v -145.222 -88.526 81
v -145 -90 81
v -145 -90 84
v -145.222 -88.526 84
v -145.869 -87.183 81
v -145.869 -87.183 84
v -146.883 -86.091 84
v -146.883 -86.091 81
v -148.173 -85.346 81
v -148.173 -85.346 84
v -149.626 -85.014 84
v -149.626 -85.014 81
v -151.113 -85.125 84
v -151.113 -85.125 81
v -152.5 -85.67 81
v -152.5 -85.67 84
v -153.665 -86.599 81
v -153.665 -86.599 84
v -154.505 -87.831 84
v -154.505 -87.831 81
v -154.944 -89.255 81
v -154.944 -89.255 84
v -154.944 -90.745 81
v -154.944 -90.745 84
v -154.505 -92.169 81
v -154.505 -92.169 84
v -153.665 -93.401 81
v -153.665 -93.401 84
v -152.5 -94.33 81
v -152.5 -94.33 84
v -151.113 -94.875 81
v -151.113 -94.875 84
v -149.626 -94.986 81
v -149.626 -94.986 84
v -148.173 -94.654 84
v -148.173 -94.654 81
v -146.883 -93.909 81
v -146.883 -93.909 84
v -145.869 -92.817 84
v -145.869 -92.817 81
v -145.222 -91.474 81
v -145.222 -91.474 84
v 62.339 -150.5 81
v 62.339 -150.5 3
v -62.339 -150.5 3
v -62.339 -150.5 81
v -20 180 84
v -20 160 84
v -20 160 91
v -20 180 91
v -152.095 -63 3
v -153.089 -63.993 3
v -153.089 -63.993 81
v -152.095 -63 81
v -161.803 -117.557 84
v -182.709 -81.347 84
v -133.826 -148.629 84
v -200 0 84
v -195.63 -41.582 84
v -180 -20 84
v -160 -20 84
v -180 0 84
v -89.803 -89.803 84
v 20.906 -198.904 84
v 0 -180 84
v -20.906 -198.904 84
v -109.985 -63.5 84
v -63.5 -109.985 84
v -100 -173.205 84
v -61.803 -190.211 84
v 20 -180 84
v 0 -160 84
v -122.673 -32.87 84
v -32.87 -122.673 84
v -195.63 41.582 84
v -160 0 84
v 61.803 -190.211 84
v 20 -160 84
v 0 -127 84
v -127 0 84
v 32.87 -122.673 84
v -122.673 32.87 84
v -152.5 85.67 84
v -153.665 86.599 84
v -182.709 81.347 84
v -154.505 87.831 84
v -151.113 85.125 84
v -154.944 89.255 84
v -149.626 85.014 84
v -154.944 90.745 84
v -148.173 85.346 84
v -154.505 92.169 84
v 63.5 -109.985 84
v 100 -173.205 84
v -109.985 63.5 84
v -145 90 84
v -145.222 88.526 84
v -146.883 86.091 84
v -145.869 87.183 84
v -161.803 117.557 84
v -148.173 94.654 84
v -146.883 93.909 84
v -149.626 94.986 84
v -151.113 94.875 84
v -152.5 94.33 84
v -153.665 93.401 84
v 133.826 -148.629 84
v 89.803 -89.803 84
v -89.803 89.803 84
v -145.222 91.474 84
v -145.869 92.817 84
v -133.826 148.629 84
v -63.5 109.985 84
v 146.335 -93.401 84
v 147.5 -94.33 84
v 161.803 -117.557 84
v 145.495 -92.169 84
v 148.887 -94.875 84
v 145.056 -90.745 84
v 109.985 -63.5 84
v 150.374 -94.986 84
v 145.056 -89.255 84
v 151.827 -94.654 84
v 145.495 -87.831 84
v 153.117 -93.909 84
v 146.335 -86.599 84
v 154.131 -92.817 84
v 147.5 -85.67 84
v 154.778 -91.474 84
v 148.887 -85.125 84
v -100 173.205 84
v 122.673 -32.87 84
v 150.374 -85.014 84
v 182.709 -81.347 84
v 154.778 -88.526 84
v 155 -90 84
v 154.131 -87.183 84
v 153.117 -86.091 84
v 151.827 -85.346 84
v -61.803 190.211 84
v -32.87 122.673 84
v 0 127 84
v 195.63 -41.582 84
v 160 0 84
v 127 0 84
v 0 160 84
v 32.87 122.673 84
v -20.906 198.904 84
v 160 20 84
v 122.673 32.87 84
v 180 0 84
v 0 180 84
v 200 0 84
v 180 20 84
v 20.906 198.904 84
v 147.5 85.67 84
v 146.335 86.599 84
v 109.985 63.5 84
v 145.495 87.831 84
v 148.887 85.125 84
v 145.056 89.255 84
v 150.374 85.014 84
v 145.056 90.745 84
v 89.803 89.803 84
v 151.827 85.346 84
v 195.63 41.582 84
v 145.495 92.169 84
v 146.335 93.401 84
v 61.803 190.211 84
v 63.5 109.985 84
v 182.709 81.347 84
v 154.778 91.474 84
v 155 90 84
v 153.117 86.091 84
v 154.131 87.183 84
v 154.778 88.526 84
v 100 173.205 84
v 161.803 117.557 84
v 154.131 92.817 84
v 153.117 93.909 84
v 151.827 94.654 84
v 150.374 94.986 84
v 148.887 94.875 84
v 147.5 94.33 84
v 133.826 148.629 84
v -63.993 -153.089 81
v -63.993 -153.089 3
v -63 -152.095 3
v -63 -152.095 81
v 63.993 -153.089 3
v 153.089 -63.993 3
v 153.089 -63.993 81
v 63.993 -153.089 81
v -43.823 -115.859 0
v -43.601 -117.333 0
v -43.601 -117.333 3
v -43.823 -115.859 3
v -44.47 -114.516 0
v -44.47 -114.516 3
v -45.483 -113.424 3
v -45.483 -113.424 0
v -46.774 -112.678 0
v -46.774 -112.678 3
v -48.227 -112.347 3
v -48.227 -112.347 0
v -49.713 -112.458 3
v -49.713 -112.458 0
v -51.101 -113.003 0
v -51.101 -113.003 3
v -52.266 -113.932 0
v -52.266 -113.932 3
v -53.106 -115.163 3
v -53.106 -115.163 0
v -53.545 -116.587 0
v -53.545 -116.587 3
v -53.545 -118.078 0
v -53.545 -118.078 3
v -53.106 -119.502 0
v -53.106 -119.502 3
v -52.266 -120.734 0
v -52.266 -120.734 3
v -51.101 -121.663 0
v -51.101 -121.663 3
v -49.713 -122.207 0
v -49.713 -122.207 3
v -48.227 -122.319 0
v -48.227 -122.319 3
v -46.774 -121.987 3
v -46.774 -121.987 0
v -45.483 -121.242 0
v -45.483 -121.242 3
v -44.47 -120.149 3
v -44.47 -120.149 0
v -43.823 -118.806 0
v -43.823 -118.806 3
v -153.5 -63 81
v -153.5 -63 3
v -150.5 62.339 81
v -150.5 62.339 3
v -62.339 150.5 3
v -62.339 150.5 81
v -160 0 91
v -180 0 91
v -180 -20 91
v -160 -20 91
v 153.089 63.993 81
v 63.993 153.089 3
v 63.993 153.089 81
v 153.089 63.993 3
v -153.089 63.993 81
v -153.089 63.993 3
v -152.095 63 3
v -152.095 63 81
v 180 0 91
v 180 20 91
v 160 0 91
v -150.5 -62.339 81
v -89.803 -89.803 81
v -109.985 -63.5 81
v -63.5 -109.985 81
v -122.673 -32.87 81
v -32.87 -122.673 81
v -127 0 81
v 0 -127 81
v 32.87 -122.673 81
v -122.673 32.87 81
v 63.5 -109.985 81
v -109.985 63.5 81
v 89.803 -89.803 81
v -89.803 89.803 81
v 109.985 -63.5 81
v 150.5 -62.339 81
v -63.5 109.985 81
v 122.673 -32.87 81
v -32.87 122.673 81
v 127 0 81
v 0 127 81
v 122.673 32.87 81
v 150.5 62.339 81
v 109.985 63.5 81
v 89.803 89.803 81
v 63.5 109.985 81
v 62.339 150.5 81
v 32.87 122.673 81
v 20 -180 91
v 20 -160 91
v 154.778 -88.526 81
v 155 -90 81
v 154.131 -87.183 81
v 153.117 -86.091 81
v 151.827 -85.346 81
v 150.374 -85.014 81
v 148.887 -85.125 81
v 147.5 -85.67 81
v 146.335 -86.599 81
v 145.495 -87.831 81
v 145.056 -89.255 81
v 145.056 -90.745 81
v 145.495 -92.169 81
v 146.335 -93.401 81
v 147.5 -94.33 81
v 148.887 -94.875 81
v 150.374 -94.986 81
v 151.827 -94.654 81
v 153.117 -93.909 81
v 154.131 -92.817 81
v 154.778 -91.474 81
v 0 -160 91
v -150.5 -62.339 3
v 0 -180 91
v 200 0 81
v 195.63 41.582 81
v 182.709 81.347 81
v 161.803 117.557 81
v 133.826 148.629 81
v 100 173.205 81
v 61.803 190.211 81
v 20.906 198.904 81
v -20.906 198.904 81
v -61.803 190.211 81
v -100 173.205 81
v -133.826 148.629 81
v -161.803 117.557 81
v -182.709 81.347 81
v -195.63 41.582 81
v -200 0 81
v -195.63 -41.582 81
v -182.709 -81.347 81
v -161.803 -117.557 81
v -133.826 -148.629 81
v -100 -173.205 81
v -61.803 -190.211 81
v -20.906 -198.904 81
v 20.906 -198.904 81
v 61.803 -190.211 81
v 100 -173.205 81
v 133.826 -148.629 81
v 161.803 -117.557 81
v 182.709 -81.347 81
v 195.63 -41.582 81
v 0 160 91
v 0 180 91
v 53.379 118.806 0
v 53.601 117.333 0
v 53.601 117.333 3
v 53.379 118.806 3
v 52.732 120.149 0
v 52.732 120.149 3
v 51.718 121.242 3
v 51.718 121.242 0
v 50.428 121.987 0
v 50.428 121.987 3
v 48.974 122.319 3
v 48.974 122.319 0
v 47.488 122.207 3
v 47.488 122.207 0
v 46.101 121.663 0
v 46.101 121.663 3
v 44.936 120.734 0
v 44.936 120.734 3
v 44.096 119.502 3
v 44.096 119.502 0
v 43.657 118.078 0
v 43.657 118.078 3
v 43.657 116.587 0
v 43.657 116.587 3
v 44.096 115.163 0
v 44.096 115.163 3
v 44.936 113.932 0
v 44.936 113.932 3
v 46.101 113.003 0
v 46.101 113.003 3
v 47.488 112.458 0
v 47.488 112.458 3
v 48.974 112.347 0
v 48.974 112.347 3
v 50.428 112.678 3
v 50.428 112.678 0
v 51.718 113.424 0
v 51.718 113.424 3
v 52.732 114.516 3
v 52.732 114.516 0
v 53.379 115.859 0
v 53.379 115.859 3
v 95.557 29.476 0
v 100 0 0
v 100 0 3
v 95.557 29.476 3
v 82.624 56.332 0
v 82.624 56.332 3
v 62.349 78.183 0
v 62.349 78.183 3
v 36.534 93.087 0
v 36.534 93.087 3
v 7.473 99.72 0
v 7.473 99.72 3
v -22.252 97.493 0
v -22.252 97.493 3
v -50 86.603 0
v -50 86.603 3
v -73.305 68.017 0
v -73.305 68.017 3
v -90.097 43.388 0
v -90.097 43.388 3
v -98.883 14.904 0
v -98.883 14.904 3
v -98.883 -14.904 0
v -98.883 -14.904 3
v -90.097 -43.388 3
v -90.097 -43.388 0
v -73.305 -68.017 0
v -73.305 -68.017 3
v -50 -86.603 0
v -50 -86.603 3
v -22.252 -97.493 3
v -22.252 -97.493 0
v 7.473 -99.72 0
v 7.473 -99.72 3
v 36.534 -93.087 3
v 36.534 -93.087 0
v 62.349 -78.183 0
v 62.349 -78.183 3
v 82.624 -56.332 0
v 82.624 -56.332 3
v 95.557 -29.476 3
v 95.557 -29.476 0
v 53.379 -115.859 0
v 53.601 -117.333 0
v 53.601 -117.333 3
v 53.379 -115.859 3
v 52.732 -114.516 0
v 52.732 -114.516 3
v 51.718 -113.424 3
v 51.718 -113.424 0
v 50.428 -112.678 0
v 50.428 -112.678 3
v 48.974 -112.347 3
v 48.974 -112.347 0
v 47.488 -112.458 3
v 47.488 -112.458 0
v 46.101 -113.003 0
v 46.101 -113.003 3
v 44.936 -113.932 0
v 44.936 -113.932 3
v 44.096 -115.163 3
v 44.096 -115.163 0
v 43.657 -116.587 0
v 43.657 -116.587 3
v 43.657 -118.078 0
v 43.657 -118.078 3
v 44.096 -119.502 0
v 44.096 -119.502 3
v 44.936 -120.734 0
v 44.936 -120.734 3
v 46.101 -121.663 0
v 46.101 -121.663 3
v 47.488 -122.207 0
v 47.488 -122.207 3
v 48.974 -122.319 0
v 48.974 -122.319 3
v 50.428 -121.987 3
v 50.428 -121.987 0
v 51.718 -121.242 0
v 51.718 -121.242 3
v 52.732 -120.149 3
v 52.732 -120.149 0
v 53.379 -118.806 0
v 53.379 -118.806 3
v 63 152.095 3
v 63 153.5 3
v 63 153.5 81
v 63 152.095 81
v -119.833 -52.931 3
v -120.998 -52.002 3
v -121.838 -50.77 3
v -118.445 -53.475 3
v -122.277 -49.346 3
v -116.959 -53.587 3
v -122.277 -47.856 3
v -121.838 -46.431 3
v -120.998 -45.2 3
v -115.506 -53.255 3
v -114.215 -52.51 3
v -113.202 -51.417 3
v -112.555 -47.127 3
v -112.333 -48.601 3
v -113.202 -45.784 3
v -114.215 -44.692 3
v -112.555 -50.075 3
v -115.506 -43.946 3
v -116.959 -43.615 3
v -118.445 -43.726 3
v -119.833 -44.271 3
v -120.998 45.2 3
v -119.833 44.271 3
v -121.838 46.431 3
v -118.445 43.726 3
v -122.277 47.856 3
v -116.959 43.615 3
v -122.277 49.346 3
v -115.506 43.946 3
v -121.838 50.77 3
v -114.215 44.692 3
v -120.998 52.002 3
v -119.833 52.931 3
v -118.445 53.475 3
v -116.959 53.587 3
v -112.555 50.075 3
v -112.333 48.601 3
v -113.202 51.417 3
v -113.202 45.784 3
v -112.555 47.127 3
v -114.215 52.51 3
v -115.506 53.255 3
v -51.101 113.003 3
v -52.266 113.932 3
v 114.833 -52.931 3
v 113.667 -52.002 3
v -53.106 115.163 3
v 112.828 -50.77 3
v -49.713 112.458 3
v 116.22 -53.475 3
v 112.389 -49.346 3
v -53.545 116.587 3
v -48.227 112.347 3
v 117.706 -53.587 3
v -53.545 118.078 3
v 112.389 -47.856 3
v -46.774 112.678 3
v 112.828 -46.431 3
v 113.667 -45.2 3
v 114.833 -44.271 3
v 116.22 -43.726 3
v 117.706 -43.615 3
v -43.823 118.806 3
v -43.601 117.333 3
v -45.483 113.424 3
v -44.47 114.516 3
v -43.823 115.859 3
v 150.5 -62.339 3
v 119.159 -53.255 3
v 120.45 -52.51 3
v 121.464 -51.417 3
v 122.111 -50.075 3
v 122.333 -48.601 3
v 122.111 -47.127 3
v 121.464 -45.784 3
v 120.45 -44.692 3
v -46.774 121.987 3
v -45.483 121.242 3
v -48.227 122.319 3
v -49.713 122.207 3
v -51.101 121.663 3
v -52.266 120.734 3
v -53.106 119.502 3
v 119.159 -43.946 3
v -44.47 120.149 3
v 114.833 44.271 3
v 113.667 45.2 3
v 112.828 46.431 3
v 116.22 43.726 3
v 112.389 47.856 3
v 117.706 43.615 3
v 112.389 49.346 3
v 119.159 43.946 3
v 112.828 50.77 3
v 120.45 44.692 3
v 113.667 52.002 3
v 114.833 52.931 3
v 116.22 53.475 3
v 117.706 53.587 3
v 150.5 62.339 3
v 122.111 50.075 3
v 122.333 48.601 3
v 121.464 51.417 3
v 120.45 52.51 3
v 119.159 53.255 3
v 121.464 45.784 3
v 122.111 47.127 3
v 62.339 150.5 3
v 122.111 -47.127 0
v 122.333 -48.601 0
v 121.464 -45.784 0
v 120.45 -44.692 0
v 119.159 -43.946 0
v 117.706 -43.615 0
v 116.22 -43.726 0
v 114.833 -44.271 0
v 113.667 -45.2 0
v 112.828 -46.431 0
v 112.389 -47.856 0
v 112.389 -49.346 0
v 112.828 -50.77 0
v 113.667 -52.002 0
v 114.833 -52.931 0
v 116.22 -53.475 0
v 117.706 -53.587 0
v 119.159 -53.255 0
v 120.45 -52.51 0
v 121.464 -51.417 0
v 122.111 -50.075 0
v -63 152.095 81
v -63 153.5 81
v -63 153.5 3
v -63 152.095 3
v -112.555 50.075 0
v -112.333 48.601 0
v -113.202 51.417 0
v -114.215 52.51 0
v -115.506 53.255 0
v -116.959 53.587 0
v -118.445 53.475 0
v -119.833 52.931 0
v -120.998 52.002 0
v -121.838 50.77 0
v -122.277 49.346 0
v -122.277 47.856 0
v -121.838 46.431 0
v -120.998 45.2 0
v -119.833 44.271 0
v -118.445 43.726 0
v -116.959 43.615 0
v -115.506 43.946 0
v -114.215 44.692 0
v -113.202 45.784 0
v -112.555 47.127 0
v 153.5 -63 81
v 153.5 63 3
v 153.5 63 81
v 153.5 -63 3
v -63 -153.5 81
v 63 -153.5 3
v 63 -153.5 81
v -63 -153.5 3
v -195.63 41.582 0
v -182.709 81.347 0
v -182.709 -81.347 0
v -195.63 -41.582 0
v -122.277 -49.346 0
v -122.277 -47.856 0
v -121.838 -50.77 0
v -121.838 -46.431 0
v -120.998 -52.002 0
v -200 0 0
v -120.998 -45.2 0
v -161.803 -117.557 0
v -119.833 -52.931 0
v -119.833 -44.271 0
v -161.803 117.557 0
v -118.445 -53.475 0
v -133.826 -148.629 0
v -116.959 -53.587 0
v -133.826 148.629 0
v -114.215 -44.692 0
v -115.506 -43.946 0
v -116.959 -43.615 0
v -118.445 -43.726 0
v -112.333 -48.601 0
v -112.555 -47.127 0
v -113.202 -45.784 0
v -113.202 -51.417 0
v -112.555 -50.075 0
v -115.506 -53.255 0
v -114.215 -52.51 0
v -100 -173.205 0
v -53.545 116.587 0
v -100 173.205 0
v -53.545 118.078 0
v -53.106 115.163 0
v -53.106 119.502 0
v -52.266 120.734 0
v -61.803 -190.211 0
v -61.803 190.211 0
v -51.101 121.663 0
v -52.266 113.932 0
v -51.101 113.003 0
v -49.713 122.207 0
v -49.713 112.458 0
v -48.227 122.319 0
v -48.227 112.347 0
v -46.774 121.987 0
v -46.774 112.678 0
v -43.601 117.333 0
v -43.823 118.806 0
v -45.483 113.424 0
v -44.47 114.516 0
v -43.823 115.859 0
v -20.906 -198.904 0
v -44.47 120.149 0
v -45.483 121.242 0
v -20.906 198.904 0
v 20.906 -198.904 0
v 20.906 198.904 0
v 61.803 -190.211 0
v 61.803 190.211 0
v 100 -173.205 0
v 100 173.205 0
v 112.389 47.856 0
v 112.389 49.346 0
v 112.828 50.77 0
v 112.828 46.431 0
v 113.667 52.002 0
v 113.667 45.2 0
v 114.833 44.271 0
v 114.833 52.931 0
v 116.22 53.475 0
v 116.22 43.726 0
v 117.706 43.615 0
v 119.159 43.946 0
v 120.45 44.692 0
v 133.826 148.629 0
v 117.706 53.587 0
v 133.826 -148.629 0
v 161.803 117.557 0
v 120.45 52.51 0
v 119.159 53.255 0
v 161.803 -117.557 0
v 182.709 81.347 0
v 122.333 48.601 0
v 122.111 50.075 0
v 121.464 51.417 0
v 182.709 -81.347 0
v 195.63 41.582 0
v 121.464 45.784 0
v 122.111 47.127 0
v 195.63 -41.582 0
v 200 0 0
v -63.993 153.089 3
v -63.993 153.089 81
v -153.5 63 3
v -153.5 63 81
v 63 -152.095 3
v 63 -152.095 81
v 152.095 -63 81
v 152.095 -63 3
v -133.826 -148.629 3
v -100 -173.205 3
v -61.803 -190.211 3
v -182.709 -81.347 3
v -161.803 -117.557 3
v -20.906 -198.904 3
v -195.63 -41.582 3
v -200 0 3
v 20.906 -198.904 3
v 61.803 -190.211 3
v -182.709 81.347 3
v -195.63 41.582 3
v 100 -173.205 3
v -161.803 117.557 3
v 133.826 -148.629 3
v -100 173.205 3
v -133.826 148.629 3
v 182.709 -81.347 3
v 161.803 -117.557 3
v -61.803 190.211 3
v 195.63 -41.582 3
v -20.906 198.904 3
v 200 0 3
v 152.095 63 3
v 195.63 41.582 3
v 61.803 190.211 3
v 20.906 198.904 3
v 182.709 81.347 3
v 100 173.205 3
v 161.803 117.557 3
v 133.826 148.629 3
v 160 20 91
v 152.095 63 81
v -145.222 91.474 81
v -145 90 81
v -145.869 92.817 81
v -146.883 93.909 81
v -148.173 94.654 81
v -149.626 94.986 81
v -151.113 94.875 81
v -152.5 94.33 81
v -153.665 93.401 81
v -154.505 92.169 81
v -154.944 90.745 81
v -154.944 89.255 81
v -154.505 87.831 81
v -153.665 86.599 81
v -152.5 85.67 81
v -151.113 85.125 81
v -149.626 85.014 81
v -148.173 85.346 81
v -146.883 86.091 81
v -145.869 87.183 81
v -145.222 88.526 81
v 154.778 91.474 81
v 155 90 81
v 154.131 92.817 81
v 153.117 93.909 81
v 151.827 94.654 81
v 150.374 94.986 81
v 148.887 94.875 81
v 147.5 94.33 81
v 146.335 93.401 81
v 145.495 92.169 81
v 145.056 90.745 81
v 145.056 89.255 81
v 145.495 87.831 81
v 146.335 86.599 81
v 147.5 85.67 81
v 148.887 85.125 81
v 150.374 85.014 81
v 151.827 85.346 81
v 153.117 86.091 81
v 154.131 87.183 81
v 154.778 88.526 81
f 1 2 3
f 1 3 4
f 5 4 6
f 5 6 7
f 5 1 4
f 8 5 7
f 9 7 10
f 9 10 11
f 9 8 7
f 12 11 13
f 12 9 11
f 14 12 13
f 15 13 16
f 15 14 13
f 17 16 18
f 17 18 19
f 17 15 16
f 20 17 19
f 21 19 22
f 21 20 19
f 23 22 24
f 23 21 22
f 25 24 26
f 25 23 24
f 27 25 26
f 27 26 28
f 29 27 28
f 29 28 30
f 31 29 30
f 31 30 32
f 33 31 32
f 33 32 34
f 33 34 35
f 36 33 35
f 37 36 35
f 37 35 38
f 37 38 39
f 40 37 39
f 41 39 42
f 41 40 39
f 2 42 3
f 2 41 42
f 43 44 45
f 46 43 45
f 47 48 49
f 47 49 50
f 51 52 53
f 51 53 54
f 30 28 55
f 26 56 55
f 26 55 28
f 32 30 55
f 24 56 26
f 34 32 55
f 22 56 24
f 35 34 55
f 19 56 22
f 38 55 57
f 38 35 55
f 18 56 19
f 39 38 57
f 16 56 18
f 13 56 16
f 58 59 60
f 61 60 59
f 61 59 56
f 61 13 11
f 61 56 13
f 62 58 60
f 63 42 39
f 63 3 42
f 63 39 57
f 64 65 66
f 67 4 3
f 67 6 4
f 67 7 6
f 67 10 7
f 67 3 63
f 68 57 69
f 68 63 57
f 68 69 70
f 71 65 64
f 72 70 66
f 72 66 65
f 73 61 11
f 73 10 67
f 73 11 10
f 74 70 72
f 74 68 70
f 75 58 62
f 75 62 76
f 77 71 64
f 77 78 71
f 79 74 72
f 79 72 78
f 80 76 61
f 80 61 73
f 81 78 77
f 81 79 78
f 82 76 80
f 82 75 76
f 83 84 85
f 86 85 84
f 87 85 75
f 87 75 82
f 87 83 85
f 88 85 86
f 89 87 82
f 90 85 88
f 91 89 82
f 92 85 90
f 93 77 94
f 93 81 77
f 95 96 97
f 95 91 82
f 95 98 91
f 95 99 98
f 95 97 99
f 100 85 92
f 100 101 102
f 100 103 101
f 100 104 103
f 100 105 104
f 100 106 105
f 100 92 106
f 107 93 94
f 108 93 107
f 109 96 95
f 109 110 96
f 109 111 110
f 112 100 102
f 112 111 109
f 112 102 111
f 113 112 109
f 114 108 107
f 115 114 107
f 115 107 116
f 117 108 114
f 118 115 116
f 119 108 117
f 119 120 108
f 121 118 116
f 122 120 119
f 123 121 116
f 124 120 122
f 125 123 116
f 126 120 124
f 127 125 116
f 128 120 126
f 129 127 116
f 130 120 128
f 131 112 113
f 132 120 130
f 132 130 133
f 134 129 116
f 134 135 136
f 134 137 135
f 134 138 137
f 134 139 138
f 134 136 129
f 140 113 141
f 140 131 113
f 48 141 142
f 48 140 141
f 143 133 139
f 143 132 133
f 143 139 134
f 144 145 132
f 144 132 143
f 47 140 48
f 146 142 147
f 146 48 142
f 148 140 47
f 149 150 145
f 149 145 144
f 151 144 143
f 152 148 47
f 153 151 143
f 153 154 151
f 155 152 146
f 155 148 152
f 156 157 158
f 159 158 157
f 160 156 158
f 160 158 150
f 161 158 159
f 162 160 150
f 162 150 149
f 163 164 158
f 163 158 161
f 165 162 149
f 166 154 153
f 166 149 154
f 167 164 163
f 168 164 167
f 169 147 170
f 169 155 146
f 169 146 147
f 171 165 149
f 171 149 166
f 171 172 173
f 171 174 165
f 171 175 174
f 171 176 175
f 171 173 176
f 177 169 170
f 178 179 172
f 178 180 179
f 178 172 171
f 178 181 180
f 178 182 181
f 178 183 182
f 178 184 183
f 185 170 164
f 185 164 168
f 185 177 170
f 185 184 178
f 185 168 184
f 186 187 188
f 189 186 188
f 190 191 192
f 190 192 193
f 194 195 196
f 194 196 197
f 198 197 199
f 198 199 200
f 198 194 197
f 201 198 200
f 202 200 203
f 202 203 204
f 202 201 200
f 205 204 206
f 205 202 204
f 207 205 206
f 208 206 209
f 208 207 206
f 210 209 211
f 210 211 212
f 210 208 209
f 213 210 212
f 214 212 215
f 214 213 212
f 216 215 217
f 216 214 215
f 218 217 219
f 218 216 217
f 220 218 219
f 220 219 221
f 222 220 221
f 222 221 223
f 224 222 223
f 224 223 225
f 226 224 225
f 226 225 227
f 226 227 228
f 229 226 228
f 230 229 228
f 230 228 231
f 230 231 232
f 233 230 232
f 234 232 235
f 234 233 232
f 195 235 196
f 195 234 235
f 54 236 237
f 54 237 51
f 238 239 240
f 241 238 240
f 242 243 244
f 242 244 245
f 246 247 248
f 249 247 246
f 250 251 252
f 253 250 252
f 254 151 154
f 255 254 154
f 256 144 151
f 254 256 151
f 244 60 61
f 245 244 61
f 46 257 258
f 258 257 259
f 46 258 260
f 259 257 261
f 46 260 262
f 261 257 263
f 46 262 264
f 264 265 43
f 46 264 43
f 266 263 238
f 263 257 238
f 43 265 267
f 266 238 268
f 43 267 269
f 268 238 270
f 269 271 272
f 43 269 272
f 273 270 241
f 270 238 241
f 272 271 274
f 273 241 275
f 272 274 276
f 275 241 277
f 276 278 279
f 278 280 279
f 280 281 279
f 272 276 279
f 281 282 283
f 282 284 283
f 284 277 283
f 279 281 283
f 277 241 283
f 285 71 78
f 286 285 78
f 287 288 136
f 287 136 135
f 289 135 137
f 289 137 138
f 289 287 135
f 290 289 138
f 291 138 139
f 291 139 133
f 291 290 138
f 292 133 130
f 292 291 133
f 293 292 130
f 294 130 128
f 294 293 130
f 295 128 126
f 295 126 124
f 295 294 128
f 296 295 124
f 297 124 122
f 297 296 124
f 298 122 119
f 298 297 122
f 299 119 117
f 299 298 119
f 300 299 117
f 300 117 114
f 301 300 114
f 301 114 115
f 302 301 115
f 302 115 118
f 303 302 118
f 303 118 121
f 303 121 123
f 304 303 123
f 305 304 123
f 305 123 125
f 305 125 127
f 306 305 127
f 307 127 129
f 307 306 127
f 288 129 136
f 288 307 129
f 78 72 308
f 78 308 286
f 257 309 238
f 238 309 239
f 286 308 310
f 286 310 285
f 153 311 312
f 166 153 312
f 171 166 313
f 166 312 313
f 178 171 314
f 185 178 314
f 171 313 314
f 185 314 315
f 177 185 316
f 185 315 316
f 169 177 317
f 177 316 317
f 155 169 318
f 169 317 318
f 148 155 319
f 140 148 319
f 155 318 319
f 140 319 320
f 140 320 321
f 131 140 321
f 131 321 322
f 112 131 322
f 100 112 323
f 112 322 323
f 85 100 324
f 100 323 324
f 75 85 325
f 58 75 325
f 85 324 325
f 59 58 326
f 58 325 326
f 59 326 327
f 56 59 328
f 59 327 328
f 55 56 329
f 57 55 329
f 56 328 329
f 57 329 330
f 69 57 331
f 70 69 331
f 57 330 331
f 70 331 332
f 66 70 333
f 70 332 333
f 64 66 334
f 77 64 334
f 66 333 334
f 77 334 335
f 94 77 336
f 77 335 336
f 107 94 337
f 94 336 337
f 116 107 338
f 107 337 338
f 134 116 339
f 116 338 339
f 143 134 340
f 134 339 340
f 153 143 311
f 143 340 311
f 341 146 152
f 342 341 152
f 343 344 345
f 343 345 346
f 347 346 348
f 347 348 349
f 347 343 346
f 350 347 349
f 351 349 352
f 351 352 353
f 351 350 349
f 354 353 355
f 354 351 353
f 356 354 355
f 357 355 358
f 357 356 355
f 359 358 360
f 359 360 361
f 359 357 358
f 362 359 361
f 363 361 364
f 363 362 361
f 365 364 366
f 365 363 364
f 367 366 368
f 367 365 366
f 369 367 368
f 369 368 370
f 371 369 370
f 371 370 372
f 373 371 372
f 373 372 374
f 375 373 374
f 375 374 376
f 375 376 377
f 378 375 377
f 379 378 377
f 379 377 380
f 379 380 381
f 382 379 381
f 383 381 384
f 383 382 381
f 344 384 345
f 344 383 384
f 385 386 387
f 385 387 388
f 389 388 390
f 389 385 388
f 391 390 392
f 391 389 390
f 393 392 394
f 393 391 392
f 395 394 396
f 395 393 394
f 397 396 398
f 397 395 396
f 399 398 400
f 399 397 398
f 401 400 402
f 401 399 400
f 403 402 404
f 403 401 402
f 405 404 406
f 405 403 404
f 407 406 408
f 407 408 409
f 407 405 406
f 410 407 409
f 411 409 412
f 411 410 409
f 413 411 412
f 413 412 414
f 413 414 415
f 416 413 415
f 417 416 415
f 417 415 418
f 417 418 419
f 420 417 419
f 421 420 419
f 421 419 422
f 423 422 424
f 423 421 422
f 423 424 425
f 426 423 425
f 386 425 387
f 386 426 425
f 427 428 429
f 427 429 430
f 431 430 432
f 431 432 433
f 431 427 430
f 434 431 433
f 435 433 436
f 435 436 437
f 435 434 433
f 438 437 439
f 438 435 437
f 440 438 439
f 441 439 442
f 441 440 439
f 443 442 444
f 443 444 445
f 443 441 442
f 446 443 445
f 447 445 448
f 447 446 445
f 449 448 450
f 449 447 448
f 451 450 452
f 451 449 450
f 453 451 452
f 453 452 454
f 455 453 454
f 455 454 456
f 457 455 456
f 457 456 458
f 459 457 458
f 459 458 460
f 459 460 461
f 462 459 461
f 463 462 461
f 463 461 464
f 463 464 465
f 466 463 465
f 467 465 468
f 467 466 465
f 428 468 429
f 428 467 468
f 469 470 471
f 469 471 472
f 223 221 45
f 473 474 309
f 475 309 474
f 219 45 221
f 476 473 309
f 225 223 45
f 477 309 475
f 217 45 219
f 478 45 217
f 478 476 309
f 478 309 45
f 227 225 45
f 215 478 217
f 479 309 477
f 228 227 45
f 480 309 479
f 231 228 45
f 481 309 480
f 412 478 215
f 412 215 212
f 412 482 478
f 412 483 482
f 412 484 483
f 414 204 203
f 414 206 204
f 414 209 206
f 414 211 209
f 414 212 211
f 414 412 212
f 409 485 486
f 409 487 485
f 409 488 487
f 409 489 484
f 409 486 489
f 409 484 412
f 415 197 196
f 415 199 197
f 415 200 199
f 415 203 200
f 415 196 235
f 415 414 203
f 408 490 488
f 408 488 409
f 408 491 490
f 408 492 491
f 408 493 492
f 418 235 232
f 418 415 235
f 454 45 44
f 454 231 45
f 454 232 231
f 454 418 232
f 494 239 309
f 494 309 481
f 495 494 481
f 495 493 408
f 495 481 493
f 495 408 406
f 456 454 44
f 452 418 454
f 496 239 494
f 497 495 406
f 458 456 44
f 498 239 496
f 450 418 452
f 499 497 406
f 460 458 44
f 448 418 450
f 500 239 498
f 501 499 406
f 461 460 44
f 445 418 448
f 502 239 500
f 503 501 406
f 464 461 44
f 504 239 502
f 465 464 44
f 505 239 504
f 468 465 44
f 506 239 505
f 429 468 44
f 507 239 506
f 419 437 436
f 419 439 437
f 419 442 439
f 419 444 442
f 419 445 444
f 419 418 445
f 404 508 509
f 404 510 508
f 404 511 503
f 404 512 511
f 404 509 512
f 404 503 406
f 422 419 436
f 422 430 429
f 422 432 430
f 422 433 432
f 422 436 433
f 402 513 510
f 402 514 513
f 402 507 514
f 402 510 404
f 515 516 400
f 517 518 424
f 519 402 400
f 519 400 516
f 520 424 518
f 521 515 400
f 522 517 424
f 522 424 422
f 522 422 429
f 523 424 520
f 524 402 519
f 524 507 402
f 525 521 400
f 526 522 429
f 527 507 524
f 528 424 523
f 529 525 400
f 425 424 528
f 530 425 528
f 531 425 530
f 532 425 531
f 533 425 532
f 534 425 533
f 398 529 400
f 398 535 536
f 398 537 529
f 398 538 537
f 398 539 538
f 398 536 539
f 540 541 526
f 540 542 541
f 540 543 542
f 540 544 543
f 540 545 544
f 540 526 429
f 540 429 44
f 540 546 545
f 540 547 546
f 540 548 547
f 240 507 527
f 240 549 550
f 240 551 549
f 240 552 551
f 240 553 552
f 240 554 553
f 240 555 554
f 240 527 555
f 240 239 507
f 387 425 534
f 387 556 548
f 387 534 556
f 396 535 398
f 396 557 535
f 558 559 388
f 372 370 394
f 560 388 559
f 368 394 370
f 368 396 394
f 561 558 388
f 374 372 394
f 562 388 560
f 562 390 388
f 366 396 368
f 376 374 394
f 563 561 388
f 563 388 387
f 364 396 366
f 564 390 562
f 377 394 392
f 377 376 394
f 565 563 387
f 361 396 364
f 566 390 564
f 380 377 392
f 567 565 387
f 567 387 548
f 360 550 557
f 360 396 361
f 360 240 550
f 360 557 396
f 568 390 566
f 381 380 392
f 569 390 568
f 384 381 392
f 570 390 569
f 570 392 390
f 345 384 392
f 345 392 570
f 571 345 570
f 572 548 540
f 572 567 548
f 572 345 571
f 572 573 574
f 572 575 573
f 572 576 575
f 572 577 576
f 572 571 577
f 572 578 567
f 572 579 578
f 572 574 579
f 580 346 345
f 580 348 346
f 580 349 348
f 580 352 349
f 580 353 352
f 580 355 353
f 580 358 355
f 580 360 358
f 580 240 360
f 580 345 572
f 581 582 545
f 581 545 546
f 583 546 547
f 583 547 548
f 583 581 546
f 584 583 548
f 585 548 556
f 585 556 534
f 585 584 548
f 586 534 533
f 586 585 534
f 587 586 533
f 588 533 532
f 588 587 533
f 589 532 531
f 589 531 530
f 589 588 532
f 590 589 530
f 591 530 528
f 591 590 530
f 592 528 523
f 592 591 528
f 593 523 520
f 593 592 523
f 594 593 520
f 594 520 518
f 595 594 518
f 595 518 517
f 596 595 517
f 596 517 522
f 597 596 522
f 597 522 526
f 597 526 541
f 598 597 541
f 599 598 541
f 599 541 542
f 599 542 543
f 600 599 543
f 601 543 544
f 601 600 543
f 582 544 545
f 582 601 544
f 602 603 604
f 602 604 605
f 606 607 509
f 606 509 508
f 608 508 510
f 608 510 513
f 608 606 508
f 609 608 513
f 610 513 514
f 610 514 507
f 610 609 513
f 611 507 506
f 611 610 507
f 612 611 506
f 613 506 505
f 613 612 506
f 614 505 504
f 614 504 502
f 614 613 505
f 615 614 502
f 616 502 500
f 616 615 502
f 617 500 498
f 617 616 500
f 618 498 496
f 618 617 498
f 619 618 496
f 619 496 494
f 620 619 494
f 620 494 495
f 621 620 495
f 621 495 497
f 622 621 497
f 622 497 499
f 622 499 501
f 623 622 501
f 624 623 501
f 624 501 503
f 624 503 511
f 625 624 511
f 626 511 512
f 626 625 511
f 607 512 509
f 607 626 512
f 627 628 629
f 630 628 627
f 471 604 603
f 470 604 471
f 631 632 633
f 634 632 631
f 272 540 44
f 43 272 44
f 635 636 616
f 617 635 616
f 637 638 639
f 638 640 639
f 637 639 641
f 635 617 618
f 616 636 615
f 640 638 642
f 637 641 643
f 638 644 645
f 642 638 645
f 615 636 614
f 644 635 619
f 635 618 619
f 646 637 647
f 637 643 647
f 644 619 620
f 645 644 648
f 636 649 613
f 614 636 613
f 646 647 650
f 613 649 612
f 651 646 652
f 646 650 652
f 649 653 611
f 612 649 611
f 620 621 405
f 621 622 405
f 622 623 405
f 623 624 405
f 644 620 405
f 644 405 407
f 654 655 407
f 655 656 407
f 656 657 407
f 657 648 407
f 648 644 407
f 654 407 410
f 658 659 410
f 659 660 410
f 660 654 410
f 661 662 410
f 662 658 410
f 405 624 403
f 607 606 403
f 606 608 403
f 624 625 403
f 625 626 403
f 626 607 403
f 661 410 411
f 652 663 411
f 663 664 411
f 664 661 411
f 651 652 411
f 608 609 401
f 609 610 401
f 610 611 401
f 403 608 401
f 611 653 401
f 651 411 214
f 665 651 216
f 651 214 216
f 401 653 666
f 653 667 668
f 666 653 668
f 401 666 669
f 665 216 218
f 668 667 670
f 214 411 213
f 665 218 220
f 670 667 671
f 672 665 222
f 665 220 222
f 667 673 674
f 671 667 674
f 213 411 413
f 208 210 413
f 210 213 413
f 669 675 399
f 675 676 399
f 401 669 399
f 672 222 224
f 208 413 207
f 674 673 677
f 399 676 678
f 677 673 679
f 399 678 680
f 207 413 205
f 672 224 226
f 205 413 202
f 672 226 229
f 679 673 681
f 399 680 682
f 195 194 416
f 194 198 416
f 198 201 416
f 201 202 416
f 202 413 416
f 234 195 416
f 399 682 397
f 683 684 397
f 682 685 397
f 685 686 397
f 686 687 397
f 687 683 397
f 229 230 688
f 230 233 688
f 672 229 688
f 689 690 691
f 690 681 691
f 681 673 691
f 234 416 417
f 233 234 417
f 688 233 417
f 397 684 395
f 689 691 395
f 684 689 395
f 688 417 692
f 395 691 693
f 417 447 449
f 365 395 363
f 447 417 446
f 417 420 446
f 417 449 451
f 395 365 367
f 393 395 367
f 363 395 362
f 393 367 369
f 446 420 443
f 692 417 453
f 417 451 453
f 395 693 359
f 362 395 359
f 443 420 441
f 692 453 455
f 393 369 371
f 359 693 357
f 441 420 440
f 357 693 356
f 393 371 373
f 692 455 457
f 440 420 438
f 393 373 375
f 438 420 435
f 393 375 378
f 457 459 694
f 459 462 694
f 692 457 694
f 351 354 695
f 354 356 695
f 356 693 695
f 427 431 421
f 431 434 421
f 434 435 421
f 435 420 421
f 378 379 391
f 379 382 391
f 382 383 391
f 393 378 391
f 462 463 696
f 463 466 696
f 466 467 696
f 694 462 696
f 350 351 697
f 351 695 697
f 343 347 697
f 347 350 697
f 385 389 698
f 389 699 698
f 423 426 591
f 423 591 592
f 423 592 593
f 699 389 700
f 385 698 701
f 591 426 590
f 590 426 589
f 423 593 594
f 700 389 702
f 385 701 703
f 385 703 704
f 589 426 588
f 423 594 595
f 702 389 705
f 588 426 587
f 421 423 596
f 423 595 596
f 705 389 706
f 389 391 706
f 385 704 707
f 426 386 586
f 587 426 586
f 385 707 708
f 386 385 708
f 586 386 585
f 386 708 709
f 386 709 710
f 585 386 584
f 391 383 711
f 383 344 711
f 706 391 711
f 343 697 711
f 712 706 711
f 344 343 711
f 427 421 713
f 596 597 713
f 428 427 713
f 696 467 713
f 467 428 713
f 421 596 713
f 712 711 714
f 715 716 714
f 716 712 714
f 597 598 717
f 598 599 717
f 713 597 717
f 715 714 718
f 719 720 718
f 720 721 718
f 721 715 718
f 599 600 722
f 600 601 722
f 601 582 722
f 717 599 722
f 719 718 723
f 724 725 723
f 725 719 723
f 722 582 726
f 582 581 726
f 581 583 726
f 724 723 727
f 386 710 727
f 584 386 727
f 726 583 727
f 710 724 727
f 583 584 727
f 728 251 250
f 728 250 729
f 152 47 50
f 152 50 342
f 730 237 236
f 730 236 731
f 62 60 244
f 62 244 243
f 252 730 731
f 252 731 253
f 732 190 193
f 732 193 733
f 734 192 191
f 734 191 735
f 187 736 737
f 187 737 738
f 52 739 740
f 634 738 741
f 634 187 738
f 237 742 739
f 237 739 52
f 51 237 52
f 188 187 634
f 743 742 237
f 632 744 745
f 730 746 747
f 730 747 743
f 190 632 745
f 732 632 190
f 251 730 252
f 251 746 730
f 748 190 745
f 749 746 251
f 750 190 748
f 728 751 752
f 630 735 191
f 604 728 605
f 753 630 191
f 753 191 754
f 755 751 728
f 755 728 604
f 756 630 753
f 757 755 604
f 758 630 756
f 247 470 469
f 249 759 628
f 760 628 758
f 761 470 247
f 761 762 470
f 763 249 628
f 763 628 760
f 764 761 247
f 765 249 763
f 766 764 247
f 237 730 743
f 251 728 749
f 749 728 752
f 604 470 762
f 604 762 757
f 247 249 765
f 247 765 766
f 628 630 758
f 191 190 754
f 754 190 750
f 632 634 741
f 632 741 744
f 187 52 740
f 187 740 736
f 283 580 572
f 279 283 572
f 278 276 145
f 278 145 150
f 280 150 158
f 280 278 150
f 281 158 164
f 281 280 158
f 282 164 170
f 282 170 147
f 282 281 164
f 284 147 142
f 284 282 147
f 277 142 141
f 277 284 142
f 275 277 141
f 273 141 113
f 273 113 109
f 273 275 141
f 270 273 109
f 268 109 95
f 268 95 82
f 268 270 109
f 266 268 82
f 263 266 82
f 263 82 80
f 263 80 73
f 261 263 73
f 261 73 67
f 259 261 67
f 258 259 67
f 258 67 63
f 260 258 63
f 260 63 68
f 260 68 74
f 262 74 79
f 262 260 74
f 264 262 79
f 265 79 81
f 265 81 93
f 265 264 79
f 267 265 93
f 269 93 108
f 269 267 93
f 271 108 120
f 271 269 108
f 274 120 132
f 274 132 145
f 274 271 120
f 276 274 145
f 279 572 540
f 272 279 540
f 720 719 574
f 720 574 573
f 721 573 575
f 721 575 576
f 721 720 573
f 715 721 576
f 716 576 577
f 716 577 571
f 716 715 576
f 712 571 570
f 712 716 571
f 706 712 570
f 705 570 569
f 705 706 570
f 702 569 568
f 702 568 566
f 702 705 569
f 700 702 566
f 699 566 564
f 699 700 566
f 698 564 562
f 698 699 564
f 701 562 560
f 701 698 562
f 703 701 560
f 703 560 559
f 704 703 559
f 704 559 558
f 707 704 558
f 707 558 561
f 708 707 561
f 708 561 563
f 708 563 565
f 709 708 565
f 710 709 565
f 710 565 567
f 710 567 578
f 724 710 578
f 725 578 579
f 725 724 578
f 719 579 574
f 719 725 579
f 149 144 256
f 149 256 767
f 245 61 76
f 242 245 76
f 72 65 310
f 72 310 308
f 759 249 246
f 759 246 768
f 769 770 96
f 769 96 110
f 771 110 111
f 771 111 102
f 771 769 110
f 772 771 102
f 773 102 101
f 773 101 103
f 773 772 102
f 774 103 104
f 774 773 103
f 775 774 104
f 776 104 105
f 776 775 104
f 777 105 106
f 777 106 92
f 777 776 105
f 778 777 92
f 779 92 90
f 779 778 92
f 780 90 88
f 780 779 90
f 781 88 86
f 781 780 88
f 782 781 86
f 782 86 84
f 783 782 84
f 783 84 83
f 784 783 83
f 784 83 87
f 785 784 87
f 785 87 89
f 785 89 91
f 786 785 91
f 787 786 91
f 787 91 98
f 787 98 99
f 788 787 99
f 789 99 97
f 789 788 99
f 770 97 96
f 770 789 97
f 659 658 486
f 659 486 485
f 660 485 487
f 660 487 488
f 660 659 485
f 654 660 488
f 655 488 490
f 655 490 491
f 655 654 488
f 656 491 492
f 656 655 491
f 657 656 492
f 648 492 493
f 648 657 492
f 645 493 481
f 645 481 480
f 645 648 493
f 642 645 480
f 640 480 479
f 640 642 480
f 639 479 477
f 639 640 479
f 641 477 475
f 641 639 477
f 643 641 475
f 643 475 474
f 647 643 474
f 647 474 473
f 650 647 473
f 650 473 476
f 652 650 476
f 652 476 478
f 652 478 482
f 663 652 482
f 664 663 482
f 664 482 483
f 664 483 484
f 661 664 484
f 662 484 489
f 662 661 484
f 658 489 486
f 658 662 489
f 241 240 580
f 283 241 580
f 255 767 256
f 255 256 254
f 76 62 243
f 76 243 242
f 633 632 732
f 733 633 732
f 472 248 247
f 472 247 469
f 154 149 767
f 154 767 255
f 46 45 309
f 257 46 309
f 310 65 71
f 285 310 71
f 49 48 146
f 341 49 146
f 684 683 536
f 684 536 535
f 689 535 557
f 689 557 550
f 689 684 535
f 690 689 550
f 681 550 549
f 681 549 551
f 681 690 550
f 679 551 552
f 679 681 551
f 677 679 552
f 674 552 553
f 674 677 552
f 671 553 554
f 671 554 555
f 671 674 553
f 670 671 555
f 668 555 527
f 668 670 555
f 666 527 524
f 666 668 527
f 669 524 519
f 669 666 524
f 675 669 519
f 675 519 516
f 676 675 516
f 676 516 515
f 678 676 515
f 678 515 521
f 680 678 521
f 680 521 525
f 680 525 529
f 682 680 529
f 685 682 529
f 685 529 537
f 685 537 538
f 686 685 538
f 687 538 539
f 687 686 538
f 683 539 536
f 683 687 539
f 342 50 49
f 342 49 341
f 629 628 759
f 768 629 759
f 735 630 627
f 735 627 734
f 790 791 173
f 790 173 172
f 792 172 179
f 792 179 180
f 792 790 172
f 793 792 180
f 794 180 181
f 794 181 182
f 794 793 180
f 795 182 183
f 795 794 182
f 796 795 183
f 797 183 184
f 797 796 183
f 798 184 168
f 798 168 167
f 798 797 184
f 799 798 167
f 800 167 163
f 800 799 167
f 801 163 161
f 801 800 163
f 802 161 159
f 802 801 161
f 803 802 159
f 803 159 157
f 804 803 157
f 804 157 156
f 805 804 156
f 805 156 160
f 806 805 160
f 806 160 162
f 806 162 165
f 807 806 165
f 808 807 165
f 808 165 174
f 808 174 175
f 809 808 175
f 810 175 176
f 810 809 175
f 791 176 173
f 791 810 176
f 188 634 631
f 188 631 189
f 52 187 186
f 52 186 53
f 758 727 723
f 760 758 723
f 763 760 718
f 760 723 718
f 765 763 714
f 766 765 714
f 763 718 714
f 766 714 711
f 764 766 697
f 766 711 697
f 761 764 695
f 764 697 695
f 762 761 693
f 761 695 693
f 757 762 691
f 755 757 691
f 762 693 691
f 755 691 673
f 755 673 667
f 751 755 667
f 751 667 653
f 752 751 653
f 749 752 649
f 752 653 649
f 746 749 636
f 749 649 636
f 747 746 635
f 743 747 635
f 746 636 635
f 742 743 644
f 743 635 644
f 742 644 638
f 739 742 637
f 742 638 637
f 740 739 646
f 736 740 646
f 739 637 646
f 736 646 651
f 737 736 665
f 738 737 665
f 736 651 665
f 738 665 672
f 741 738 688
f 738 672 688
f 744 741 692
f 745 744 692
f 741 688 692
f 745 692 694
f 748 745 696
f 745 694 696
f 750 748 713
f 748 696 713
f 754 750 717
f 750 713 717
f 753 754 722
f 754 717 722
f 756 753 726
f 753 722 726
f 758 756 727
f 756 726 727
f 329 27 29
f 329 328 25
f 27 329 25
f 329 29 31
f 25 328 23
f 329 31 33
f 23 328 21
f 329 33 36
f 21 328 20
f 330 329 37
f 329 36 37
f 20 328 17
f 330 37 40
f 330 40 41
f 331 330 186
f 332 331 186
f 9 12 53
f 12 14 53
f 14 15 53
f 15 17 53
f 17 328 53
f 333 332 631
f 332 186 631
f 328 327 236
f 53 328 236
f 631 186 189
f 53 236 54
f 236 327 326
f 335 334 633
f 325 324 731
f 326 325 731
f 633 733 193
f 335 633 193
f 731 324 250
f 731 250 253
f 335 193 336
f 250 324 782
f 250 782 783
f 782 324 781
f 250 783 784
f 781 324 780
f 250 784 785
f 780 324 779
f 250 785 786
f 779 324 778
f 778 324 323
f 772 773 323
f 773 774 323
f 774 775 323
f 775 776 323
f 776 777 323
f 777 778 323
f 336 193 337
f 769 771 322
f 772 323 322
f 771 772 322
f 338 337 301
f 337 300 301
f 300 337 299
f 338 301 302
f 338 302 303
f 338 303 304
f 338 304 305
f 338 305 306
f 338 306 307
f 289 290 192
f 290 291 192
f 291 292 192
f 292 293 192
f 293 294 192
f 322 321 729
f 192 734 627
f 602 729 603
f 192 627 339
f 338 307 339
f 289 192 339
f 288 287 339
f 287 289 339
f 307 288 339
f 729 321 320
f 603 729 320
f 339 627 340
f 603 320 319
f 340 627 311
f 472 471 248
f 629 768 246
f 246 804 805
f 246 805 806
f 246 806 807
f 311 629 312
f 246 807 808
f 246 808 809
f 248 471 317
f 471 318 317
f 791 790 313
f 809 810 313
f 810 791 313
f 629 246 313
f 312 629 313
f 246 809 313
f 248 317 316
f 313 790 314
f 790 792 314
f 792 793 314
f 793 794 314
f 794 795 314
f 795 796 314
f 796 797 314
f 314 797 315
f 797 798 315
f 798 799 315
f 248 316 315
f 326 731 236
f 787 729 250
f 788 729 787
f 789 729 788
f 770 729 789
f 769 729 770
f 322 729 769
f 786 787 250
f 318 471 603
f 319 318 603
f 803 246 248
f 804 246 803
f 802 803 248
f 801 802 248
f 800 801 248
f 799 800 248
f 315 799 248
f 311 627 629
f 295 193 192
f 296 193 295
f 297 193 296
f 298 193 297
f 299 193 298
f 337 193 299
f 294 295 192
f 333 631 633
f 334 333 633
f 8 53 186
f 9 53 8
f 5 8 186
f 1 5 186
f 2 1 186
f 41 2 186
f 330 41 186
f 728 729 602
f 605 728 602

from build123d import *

# Parameters (mm, degrees)
SKETCH_R           = 200
SKETCH_R_2         = 100
SKETCH_R_3         = 5
PAD_DEPTH          = 3
SKETCH001_W        = 3
SKETCH001_H        = 126
PAD001_DEPTH       = 84
SKETCH002_R        = 200
SKETCH002_R_2      = 127
SKETCH002_R_3      = 5
PAD002_DEPTH       = 3
POLARPATTERN_COUNT = 8
SKETCH003_W        = 20
SKETCH003_H        = 20
PAD003_DEPTH       = 10


with BuildPart() as part:
    # Sketch → Pad (new body)
    with BuildSketch(Plane.XY):
        Circle(SKETCH_R)
        Circle(SKETCH_R_2, mode=Mode.SUBTRACT)
        with Locations((-117.332701, 48.600796)):
            Circle(SKETCH_R_3, mode=Mode.SUBTRACT)
        with Locations((-48.600796, 117.332701)):
            Circle(SKETCH_R_3, mode=Mode.SUBTRACT)
        with Locations((48.600796, 117.332701)):
            Circle(SKETCH_R_3, mode=Mode.SUBTRACT)
        with Locations((117.332701, 48.600796)):
            Circle(SKETCH_R_3, mode=Mode.SUBTRACT)
        with Locations((117.332701, -48.600796)):
            Circle(SKETCH_R_3, mode=Mode.SUBTRACT)
        with Locations((48.600796, -117.332701)):
            Circle(SKETCH_R_3, mode=Mode.SUBTRACT)
        with Locations((-48.600796, -117.332701)):
            Circle(SKETCH_R_3, mode=Mode.SUBTRACT)
        with Locations((-117.332701, -48.600796)):
            Circle(SKETCH_R_3, mode=Mode.SUBTRACT)
    extrude(amount=PAD_DEPTH)

    # Sketch001 → Pad001 (join)
    with BuildSketch(Plane.XY):
        with Locations((-152, 0)):
            Rectangle(SKETCH001_W, SKETCH001_H)
    pad001 = extrude(amount=PAD001_DEPTH)

    # Sketch002 (on DatumPlane) → Pad002 (join)
    with BuildSketch(Plane.XY.offset(81)):
        Circle(SKETCH002_R)
        Circle(SKETCH002_R_2, mode=Mode.SUBTRACT)
        with Locations((-150, 90)):
            Circle(SKETCH002_R_3, mode=Mode.SUBTRACT)
        with Locations((-150, -90)):
            Circle(SKETCH002_R_3, mode=Mode.SUBTRACT)
        with Locations((150, 90)):
            Circle(SKETCH002_R_3, mode=Mode.SUBTRACT)
        with Locations((150, -90)):
            Circle(SKETCH002_R_3, mode=Mode.SUBTRACT)
    extrude(amount=PAD002_DEPTH)

    # PolarPattern: Pad001 ×8 about axis
    polarpattern_axis = Axis((0, 0, 0), (0, 0, 1))
    for i in range(1, POLARPATTERN_COUNT):
        add(pad001.rotate(polarpattern_axis, i * 360 / POLARPATTERN_COUNT))

    # Sketch003 (on DatumPlane) → Pad003 (join)
    with BuildSketch(Plane.XY.offset(81)):
        with Locations((170, 10)):
            Rectangle(SKETCH003_W, SKETCH003_H)
        with Locations((-10, 170)):
            Rectangle(SKETCH003_W, SKETCH003_H)
        with Locations((-170, -10)):
            Rectangle(SKETCH003_W, SKETCH003_H)
        with Locations((10, -170)):
            Rectangle(SKETCH003_W, SKETCH003_H)
    extrude(amount=PAD003_DEPTH)


solid = part.part
